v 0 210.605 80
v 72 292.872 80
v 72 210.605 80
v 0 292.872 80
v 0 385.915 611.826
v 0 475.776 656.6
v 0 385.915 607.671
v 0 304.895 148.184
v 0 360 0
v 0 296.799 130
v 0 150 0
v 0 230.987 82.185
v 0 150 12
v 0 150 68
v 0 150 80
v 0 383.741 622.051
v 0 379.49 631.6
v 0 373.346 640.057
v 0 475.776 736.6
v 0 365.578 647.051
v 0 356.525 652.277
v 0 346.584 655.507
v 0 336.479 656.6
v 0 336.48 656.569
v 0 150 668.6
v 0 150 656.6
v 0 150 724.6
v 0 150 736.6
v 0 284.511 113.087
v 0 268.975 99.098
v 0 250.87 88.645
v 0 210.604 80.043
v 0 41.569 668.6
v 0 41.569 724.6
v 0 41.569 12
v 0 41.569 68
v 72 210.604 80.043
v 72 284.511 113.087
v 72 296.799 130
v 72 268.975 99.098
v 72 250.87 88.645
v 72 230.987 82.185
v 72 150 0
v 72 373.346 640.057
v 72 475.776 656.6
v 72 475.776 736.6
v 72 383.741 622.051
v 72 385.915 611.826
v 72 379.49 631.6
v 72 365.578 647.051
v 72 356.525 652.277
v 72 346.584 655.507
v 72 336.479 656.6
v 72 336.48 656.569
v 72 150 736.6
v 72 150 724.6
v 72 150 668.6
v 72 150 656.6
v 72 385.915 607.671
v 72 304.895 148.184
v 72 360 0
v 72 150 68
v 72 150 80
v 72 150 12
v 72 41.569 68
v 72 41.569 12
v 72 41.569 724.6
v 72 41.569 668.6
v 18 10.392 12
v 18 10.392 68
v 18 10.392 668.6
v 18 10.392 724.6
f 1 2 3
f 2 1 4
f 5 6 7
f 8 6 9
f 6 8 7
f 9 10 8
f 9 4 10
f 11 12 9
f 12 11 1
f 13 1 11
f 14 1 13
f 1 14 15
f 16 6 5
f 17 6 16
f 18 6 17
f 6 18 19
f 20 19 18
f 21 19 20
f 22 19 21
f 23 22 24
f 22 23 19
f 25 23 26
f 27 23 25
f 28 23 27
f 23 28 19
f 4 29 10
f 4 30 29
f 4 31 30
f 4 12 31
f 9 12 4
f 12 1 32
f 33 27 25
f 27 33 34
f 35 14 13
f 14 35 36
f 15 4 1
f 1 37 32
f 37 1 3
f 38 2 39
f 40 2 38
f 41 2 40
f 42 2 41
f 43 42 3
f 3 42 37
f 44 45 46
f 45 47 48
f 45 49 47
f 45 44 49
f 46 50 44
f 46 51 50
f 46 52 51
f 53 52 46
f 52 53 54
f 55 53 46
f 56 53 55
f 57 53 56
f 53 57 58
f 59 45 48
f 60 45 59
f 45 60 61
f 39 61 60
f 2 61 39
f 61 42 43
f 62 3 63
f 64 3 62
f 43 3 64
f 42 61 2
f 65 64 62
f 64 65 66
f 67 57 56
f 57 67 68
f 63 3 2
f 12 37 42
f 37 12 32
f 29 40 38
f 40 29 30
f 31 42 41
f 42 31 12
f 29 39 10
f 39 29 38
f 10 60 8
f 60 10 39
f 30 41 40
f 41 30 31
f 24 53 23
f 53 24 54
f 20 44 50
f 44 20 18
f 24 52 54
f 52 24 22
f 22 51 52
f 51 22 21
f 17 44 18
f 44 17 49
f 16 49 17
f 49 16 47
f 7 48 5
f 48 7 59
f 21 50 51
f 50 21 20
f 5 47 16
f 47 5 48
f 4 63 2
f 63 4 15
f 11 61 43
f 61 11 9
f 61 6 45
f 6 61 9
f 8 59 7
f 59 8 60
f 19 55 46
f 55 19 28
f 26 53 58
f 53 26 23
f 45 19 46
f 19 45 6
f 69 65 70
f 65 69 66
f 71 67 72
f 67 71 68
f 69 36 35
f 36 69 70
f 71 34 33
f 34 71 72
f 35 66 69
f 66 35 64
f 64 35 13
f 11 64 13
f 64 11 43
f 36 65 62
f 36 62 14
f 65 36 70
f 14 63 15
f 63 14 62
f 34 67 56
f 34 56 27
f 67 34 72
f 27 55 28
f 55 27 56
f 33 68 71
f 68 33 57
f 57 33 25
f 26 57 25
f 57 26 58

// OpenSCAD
// file: ybrace.scad
// ybrace
include <dims.scad>;

ybrace();

module ybrace(){
	translate([ dim_critical * -0.5, dim_yBrace * -1 - dim_baseExtension, 0])cube([dim_critical, dim_yBrace, dim_ply]);
	rotate([ 0, 0, ang_horizontal * 0.5])translate([ dim_critical * -0.5, -dim_baseExtension, 0])cube([dim_critical, dim_yBrace, dim_ply]);
	rotate([ 0, 0, ang_horizontal * -0.5])translate([ dim_critical * -0.5, -dim_baseExtension, 0])cube([dim_critical, dim_yBrace, dim_ply]);
	
	echo("dim_critical",dim_critical);
	echo("dim_baseExtension",dim_baseExtension);
	echo("dim_baseExtension + dim_critical",dim_baseExtension + dim_critical);


}

module plate(){
	scale([ 2, 1, 2])cube([dim_critical, dim_yBrace, dim_ply]);
}
// file: dims.scad
function i2m(x)=x*25.4;
function ASA(alpha,a,beta) = ((a/sin(alpha))*sin(beta));
//echo("ASA(90, 19.05, 60) == 16.5, but was ", ASA(90,19.05,60));

//Table Height
dim_tableHeight = i2m(29);

//Table Length
dim_tableLength = 2800;

// Table Width
dim_tableWidth = 1000;

// Table top
dim_tableTop = 20;

// Leg gap
dim_legGap = 1800;

// Ply Thickness
dim_ply = 12;

// Ply stack
qty_ply = 6;

//Critical dim
dim_critical = dim_ply * qty_ply;

//Vertical angle
ang_vertical = 10;

//Base thickness
dim_thickness = 80;

//Horizontal angle
ang_horizontal = 120;

// base extension
dim_baseExtension = ASA(ang_horizontal / 2 , dim_critical / 2, 90 - (ang_horizontal / 2 ));

// y brace
dim_yBrace = 150;

// Lower leg length
dim_lowerLeg = 360;

// Lower rad
rad_lower = 100;

// Upper rad
rad_upper = 50;
// main file
// Leg
include <dims.scad>;
use <ybrace.scad>;

leg();

module leg(){
	dim_hypLength = ASA(90 - ang_vertical,dim_tableHeight - dim_thickness,90);
	dim_upperLeg = dim_lowerLeg + ASA(90, dim_hypLength, ang_vertical);
	filletYLow = ASA(90 - ang_vertical, dim_thickness, ang_vertical);
	filletYUp = ASA(ang_vertical, dim_thickness, 90 - ang_vertical);
	
	difference(){
		union(){
			// lower leg
			cube([ dim_critical, dim_lowerLeg, dim_thickness]);

			// vertical
			translate([ 0, dim_lowerLeg, 0])mirror([ 0, 1, 0])rotate([ ang_vertical, 0, 0])cube([ dim_critical, dim_thickness, dim_hypLength]);
	

			// upper leg
			translate([0,0,dim_tableHeight - dim_thickness])cube([ dim_critical, dim_upperLeg, dim_thickness]);

			// lower fillet
			translate([ 0, dim_lowerLeg - dim_thickness+ filletYLow, dim_thickness])fillet(rad_lower, ang_vertical, dim_critical);
	
			// upperFillet
			translate([0, dim_upperLeg - dim_thickness ,dim_tableHeight - dim_thickness])mirror([ 0, 0, 1])fillet(rad_upper, -ang_vertical, dim_critical);
		}
		translate([0,0,-1])rotate([0,0, ang_horizontal / 4])mirror([0,1,0])cube([1000,1000,1000]);
		rotate([ 0, 0,ang_horizontal / 4])translate([ -100 + dim_baseExtension, 0, 0])cube([200,200,2000], center=true);
		
		translate([ dim_critical * -0.5, 0, -1 * dim_ply])plate();
		translate([ dim_critical * -0.5, 0, dim_thickness - dim_ply])plate();
		
		translate([ dim_critical * -0.5, 0, dim_tableHeight -1 * dim_ply])plate();
		translate([ dim_critical * -0.5, 0, dim_tableHeight -1 * dim_ply - dim_thickness])plate();
	}

}


module fillet( rad, angle, thickness ){
	yAmt = ASA((angle+90)/2, rad, 90-((angle+90)/2));
	difference(){
		mirror([ 1, 0, 0])rotate([ -angle, 0, 0])rotate([ 0, -90, 0])slice(r = yAmt, deg = angle + 90, thick = thickness);
		translate([ -1, -yAmt, rad])rotate([ 0, 90, 0])cylinder(r = rad, h = thickness + 2);
	}
}

module slice(r = 10, deg = 30, thick = 10) {
	degn = (deg % 360 > 0) ? deg % 360 : deg % 360 + 360;
	difference() {
		cylinder(r = r, h = thick);
		if (degn > 180) intersection_for(a = [0, 180 - degn]) rotate(a) translate([-r, 0, -1]) cube([r * 2,r * 2,thick + 2]);
		else union() for(a = [0, 180 - degn]) rotate(a) translate([-r, 0, -1]) cube([r * 2,r * 2,thick + 2]);
	}
}
